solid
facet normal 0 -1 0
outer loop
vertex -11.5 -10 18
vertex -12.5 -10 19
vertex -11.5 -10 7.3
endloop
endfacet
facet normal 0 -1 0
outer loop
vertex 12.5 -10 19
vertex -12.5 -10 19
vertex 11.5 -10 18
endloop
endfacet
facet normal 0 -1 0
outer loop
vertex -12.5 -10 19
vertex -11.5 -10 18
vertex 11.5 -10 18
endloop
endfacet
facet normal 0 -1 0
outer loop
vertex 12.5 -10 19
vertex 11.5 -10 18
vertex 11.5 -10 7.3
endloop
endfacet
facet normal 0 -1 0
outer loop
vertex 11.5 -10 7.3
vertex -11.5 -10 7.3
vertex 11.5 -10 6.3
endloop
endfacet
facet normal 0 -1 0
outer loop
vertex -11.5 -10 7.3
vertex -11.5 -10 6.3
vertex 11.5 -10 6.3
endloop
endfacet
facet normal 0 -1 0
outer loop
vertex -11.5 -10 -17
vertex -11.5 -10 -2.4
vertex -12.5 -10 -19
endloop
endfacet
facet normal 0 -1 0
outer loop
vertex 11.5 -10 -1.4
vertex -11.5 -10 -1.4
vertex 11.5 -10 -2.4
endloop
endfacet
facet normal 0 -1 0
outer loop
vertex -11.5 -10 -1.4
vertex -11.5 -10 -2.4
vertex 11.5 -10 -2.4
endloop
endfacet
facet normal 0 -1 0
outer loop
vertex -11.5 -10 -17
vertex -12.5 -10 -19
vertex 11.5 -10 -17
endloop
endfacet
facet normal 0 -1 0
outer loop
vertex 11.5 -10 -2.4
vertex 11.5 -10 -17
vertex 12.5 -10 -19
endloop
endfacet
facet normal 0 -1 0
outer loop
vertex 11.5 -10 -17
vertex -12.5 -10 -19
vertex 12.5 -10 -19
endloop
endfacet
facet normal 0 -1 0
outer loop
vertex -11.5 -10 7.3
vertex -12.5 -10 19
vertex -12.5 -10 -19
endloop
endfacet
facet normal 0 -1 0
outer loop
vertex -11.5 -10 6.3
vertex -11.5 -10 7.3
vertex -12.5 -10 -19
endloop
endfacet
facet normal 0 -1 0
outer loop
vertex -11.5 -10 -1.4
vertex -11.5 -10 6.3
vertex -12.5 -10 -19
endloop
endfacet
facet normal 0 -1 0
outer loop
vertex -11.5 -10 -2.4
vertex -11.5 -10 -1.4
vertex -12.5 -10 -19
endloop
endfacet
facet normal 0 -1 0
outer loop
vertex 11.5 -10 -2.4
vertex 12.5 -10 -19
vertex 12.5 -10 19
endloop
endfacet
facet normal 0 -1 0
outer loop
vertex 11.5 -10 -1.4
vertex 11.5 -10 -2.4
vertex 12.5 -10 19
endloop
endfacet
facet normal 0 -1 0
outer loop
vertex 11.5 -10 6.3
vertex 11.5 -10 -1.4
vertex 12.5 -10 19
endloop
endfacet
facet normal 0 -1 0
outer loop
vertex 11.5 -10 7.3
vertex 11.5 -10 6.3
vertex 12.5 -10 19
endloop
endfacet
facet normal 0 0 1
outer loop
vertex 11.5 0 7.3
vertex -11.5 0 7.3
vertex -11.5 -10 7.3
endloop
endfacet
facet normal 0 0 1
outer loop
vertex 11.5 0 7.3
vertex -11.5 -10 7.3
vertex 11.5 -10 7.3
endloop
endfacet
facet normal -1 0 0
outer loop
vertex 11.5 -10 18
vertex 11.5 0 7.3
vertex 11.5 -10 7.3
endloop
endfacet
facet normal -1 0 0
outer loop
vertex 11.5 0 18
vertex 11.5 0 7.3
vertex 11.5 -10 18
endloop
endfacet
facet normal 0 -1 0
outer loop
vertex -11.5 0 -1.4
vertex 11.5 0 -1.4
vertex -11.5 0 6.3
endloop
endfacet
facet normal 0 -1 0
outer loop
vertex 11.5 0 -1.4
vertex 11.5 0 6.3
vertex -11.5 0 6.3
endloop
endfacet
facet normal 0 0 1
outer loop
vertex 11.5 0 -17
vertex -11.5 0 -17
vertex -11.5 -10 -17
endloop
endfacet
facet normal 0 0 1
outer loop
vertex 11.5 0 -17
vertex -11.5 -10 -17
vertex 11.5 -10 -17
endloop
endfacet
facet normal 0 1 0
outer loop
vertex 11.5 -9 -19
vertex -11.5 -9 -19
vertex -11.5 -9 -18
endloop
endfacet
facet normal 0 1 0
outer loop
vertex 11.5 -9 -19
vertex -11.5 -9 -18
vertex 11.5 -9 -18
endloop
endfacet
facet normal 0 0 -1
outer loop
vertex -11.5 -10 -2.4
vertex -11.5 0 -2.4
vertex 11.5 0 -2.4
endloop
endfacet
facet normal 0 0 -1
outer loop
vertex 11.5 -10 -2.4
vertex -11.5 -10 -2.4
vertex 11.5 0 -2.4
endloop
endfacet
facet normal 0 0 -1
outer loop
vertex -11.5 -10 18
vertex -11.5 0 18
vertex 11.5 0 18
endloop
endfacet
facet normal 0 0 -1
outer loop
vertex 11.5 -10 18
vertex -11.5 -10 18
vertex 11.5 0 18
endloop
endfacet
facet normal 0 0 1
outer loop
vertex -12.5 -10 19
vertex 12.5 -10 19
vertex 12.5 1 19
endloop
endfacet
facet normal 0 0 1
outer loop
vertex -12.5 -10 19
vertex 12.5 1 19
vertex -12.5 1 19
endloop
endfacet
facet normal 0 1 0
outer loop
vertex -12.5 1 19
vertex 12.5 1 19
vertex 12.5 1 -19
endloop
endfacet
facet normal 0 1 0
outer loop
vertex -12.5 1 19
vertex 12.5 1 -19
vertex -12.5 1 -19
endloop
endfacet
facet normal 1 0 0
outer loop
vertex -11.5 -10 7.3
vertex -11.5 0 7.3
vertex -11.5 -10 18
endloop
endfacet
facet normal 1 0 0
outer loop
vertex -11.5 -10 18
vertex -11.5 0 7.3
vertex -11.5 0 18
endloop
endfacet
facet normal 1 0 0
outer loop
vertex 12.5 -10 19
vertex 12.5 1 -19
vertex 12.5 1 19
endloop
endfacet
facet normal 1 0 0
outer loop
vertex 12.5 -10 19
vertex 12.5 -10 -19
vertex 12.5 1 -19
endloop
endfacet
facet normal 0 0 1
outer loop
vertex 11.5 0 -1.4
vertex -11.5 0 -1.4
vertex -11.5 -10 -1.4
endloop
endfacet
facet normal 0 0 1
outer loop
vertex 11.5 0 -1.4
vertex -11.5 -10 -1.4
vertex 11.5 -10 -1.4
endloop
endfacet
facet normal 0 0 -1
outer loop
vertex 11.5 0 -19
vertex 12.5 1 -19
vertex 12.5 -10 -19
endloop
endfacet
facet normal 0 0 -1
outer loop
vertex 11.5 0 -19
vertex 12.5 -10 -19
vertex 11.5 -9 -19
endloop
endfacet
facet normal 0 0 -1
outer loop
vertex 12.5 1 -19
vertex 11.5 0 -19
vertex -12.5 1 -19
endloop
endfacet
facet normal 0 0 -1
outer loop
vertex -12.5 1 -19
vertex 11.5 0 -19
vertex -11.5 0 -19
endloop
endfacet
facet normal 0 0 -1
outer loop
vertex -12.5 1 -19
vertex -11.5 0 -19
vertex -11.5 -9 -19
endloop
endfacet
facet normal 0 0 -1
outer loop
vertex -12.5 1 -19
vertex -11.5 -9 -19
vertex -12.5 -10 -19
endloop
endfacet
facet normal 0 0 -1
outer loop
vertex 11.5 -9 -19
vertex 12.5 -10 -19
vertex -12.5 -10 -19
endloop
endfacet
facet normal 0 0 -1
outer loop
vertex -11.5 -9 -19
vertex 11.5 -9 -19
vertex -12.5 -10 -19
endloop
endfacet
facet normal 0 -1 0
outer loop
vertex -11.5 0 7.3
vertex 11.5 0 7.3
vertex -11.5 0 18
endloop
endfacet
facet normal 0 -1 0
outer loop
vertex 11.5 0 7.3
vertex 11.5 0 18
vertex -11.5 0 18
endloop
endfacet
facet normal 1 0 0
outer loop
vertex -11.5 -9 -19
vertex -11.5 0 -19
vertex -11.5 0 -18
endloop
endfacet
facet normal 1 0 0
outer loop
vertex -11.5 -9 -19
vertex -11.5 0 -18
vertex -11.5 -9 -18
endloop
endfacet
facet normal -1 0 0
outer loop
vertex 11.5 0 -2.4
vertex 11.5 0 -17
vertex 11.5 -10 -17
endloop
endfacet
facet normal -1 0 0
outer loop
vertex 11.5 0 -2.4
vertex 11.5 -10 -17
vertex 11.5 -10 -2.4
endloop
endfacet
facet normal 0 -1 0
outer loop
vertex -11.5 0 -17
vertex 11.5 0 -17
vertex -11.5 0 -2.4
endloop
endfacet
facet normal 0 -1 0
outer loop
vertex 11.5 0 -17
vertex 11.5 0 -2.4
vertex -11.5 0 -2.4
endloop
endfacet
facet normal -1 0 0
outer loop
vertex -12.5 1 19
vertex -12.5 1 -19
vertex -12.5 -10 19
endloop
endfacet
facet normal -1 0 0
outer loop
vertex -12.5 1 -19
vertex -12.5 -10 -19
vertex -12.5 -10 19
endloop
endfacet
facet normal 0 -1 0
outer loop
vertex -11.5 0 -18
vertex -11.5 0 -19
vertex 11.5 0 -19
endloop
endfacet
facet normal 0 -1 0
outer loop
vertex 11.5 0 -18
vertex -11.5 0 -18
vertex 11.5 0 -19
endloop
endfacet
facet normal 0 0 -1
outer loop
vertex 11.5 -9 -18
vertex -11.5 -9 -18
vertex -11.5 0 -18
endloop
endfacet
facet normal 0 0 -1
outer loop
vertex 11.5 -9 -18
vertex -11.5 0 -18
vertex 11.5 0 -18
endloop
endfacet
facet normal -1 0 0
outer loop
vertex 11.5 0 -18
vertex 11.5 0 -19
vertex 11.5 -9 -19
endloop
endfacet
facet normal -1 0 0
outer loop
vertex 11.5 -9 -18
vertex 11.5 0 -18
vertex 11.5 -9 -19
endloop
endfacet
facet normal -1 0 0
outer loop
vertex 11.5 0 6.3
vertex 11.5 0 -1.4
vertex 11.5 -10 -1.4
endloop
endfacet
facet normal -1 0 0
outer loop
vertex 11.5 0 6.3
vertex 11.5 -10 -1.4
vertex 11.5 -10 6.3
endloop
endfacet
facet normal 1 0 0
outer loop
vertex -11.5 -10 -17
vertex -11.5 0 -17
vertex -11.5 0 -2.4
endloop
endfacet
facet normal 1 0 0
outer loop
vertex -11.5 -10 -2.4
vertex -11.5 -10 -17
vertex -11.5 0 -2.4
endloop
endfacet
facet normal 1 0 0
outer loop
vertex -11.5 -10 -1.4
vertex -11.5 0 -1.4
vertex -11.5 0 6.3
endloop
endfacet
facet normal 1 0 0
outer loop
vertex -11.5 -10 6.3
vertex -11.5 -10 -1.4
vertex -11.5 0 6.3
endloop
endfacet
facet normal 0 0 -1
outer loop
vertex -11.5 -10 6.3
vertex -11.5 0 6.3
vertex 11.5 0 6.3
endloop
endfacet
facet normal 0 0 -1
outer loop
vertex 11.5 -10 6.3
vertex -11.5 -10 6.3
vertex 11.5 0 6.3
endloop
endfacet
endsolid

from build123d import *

# Parameters (mm, degrees)
F0_W     = 25
F0_H     = 38
F0_W_2   = 22.9999984503
F0_H_2   = 15.5999984503
F0_H_3   = 7.7
F0_H_4   = 10.7
F1_DEPTH = 10
F2_W     = 25
F2_H     = 38
F2_W_2   = 22.9999984503
F2_H_2   = 15.5999984503
F2_H_3   = 7.7
F2_H_4   = 10.7
F3_DEPTH = 1
F4_DEPTH = 1
F5_W     = 23.0000000447
F5_H     = 9.0000000447
F6_DEPTH = 1


with BuildPart() as f1:
    # F0 (on Front) → F1 (new body)
    with BuildSketch(Plane.XZ):
        Rectangle(F0_W, F0_H)
        with Locations((0, -10.2)):
            Rectangle(F0_W_2, F0_H_2, mode=Mode.SUBTRACT)
        with Locations((0, 2.4499992251)):
            Rectangle(F0_W_2, F0_H_3, mode=Mode.SUBTRACT)
        with Locations((0, 12.6499992251)):
            Rectangle(F0_W_2, F0_H_4, mode=Mode.SUBTRACT)
    extrude(amount=F1_DEPTH)

    # F2 (on face) → F3 (join)
    with BuildSketch(Plane(origin=(0, 0, 0), x_dir=(-1, 0, 0), z_dir=(0, 1, 0))):
        Rectangle(F2_W, F2_H)
        with Locations((0, -10.2)):
            Rectangle(F2_W_2, F2_H_2, mode=Mode.SUBTRACT)
        with Locations((0, 2.4499992251)):
            Rectangle(F2_W_2, F2_H_3, mode=Mode.SUBTRACT)
        with Locations((0, 12.6499992251)):
            Rectangle(F2_W_2, F2_H_4, mode=Mode.SUBTRACT)
        with Locations((0, -10.2)):
            Rectangle(F2_W_2, F2_H_2)
        with Locations((0, 12.6499992251)):
            Rectangle(F2_W_2, F2_H_4)
        with Locations((0, 2.4499992251)):
            Rectangle(F2_W_2, F2_H_3)
    extrude(amount=F3_DEPTH)

    # F4 (add): a face of the model
    f4_faces = [f1.faces().sort_by_distance(p)[0] for p in [
        (0, -5, -17.9999992251),
    ]]
    extrude(f4_faces, amount=F4_DEPTH)

    # F5 (on face) → F6 (cut)
    with BuildSketch(Plane(origin=(0, 0, -19), x_dir=(1, 0, 0), z_dir=(0, 0, -1))):
        with Locations((0, 4.5)):
            Rectangle(F5_W, F5_H)
    extrude(amount=-F6_DEPTH, mode=Mode.SUBTRACT)


solid = f1.part
